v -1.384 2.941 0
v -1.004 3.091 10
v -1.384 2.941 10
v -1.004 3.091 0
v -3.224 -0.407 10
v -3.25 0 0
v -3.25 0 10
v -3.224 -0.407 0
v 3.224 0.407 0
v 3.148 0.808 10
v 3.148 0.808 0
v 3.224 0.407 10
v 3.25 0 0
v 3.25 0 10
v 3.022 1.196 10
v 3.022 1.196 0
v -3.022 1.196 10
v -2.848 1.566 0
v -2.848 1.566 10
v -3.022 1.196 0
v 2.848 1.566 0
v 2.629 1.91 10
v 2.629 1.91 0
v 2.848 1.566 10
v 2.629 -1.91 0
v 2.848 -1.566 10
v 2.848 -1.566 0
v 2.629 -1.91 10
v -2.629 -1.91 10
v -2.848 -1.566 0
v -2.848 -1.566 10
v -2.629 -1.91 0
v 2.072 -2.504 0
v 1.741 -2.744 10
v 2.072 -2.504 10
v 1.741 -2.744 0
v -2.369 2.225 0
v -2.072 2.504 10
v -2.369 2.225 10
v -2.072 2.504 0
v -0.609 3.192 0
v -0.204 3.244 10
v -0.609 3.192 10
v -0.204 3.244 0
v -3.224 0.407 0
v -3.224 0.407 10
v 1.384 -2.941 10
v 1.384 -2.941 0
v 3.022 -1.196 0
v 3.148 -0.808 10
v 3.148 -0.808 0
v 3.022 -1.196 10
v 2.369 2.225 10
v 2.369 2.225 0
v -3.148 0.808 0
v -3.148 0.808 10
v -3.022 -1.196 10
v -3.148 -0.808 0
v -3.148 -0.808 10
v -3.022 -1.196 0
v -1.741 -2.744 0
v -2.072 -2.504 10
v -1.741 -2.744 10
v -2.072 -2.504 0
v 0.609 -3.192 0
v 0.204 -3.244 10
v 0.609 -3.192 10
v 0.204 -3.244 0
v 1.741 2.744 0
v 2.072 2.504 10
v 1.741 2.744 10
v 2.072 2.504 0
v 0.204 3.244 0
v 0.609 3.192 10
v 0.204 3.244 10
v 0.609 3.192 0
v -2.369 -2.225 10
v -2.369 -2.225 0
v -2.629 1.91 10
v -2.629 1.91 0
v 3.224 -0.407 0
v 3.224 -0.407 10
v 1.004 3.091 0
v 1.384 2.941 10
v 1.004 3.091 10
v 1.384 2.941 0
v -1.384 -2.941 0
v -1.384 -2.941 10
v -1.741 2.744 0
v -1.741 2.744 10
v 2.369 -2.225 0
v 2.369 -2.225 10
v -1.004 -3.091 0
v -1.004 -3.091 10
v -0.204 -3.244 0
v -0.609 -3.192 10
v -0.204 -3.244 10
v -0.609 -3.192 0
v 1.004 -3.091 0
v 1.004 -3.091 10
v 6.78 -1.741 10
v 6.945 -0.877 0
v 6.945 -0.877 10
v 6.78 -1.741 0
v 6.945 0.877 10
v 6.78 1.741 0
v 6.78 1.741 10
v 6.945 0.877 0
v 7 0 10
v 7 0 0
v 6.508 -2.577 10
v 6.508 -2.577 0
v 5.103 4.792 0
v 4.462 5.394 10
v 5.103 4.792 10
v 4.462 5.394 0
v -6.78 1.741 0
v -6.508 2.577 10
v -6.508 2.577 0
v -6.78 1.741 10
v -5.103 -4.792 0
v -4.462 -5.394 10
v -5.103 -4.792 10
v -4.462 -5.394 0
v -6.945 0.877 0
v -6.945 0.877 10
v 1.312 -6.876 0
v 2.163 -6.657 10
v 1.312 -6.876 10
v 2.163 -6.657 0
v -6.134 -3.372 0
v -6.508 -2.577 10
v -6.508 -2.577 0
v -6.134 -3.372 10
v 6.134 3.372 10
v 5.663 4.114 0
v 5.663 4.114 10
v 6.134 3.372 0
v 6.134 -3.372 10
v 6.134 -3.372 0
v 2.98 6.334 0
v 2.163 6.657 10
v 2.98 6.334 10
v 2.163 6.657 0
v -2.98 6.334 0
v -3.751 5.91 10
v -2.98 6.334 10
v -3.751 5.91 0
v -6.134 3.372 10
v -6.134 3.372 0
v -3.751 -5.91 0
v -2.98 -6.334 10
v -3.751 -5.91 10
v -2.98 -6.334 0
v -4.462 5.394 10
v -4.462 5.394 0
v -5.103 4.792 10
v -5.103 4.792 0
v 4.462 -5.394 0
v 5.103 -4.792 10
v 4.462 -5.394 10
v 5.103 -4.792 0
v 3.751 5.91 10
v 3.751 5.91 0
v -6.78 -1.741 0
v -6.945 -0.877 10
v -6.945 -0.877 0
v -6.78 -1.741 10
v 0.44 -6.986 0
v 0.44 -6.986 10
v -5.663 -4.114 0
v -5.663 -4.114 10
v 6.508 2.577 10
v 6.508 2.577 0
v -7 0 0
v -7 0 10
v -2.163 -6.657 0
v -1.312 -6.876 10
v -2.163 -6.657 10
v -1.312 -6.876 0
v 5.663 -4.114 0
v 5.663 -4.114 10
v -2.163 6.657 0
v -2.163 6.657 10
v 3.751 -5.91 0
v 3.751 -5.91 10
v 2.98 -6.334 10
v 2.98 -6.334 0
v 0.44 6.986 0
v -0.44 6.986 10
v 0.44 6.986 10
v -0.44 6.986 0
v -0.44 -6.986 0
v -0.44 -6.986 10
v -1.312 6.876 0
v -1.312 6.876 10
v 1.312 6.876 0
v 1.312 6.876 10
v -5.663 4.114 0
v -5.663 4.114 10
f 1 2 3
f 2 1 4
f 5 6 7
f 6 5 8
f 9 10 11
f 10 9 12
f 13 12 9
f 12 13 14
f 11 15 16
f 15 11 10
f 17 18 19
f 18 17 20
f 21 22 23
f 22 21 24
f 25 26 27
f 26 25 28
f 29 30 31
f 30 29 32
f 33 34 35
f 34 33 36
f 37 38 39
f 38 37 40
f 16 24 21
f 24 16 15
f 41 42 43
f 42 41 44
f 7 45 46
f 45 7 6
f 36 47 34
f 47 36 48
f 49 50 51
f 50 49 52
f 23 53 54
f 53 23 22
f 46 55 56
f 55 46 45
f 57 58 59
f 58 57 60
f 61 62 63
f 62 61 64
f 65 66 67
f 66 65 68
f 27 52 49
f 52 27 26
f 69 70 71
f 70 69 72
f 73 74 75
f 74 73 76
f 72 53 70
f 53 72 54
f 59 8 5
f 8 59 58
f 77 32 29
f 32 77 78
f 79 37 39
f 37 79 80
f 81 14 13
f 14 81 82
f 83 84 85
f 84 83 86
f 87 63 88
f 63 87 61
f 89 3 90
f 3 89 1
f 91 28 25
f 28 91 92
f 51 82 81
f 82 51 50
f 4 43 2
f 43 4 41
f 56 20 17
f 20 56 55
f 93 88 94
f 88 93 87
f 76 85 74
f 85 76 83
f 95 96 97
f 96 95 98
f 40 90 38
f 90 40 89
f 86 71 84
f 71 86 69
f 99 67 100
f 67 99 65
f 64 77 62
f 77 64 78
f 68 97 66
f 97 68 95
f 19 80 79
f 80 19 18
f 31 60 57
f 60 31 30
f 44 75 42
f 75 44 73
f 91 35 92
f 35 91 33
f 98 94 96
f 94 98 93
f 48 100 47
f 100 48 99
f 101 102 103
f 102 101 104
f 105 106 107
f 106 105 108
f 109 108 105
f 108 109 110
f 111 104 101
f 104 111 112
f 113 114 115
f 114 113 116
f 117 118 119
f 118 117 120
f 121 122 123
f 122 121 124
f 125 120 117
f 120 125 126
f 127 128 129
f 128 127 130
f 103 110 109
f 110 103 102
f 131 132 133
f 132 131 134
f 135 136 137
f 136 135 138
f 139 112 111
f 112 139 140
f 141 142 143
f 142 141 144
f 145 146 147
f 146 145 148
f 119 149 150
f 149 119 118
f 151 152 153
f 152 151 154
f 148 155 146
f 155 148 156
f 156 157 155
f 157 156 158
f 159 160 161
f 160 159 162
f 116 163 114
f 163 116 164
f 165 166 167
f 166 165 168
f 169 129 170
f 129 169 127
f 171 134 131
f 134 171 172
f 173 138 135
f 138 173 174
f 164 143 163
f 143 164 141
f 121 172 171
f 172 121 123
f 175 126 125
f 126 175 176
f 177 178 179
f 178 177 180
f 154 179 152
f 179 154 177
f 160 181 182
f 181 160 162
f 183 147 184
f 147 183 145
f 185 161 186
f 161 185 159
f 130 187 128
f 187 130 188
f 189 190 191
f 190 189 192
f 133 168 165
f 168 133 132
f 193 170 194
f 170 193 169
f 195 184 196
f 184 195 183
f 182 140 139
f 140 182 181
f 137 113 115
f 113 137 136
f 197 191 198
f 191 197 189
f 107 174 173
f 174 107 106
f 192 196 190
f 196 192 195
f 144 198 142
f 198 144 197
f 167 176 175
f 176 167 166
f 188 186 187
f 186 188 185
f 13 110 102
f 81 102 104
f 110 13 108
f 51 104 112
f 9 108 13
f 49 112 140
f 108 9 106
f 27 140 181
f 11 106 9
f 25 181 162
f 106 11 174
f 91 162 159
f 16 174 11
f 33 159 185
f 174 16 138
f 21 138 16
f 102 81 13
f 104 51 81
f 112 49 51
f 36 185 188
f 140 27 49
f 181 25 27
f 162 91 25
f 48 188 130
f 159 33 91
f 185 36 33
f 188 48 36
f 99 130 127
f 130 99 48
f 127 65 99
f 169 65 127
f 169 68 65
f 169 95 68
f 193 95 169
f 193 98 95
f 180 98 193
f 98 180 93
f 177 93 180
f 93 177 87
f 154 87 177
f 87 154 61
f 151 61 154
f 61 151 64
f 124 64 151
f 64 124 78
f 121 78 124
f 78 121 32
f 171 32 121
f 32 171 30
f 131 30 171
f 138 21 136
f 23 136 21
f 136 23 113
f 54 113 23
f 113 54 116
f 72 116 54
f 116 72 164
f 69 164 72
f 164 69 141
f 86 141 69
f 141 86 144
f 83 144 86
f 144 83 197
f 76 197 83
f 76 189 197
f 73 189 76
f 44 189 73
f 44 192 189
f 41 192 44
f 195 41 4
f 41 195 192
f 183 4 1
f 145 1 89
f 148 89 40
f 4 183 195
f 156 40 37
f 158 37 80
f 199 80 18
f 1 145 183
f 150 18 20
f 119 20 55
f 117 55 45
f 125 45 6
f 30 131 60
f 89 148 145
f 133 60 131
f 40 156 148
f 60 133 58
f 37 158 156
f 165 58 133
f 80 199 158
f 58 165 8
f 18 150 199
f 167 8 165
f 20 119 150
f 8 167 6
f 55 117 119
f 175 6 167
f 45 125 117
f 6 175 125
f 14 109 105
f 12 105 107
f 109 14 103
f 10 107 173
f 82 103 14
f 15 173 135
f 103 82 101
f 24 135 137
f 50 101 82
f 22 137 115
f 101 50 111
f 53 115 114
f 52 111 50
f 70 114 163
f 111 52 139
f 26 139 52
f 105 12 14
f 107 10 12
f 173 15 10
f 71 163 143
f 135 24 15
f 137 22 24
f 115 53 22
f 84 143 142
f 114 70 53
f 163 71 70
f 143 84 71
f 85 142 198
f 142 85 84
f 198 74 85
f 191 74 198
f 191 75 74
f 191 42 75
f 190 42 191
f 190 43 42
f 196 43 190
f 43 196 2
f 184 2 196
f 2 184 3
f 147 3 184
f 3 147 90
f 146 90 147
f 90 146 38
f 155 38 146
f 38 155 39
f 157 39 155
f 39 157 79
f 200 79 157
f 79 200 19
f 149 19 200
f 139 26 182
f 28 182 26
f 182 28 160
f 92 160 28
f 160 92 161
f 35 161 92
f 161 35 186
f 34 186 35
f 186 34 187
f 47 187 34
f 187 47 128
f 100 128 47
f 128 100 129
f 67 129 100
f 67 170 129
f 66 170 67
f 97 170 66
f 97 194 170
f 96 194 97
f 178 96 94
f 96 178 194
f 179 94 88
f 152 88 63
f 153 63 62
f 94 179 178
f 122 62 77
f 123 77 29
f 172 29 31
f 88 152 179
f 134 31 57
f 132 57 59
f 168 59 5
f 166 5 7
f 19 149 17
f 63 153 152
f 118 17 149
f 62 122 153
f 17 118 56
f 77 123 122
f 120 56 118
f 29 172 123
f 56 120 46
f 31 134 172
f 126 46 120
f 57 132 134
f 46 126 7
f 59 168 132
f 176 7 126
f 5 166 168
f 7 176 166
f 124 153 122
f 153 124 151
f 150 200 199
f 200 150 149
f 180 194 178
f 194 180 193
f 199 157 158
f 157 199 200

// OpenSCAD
$fn = 50;


difference() {
	union() {
		cylinder(h = 10, r = 7.0000000000);
	}
	union() {
		translate(v = [0, 0, -100]) {
			cylinder(h = 200, r = 3.2500000000);
		}
		translate(v = [0, 0, -100]) {
			cylinder(h = 200, r = 1.8000000000);
		}
	}
}
